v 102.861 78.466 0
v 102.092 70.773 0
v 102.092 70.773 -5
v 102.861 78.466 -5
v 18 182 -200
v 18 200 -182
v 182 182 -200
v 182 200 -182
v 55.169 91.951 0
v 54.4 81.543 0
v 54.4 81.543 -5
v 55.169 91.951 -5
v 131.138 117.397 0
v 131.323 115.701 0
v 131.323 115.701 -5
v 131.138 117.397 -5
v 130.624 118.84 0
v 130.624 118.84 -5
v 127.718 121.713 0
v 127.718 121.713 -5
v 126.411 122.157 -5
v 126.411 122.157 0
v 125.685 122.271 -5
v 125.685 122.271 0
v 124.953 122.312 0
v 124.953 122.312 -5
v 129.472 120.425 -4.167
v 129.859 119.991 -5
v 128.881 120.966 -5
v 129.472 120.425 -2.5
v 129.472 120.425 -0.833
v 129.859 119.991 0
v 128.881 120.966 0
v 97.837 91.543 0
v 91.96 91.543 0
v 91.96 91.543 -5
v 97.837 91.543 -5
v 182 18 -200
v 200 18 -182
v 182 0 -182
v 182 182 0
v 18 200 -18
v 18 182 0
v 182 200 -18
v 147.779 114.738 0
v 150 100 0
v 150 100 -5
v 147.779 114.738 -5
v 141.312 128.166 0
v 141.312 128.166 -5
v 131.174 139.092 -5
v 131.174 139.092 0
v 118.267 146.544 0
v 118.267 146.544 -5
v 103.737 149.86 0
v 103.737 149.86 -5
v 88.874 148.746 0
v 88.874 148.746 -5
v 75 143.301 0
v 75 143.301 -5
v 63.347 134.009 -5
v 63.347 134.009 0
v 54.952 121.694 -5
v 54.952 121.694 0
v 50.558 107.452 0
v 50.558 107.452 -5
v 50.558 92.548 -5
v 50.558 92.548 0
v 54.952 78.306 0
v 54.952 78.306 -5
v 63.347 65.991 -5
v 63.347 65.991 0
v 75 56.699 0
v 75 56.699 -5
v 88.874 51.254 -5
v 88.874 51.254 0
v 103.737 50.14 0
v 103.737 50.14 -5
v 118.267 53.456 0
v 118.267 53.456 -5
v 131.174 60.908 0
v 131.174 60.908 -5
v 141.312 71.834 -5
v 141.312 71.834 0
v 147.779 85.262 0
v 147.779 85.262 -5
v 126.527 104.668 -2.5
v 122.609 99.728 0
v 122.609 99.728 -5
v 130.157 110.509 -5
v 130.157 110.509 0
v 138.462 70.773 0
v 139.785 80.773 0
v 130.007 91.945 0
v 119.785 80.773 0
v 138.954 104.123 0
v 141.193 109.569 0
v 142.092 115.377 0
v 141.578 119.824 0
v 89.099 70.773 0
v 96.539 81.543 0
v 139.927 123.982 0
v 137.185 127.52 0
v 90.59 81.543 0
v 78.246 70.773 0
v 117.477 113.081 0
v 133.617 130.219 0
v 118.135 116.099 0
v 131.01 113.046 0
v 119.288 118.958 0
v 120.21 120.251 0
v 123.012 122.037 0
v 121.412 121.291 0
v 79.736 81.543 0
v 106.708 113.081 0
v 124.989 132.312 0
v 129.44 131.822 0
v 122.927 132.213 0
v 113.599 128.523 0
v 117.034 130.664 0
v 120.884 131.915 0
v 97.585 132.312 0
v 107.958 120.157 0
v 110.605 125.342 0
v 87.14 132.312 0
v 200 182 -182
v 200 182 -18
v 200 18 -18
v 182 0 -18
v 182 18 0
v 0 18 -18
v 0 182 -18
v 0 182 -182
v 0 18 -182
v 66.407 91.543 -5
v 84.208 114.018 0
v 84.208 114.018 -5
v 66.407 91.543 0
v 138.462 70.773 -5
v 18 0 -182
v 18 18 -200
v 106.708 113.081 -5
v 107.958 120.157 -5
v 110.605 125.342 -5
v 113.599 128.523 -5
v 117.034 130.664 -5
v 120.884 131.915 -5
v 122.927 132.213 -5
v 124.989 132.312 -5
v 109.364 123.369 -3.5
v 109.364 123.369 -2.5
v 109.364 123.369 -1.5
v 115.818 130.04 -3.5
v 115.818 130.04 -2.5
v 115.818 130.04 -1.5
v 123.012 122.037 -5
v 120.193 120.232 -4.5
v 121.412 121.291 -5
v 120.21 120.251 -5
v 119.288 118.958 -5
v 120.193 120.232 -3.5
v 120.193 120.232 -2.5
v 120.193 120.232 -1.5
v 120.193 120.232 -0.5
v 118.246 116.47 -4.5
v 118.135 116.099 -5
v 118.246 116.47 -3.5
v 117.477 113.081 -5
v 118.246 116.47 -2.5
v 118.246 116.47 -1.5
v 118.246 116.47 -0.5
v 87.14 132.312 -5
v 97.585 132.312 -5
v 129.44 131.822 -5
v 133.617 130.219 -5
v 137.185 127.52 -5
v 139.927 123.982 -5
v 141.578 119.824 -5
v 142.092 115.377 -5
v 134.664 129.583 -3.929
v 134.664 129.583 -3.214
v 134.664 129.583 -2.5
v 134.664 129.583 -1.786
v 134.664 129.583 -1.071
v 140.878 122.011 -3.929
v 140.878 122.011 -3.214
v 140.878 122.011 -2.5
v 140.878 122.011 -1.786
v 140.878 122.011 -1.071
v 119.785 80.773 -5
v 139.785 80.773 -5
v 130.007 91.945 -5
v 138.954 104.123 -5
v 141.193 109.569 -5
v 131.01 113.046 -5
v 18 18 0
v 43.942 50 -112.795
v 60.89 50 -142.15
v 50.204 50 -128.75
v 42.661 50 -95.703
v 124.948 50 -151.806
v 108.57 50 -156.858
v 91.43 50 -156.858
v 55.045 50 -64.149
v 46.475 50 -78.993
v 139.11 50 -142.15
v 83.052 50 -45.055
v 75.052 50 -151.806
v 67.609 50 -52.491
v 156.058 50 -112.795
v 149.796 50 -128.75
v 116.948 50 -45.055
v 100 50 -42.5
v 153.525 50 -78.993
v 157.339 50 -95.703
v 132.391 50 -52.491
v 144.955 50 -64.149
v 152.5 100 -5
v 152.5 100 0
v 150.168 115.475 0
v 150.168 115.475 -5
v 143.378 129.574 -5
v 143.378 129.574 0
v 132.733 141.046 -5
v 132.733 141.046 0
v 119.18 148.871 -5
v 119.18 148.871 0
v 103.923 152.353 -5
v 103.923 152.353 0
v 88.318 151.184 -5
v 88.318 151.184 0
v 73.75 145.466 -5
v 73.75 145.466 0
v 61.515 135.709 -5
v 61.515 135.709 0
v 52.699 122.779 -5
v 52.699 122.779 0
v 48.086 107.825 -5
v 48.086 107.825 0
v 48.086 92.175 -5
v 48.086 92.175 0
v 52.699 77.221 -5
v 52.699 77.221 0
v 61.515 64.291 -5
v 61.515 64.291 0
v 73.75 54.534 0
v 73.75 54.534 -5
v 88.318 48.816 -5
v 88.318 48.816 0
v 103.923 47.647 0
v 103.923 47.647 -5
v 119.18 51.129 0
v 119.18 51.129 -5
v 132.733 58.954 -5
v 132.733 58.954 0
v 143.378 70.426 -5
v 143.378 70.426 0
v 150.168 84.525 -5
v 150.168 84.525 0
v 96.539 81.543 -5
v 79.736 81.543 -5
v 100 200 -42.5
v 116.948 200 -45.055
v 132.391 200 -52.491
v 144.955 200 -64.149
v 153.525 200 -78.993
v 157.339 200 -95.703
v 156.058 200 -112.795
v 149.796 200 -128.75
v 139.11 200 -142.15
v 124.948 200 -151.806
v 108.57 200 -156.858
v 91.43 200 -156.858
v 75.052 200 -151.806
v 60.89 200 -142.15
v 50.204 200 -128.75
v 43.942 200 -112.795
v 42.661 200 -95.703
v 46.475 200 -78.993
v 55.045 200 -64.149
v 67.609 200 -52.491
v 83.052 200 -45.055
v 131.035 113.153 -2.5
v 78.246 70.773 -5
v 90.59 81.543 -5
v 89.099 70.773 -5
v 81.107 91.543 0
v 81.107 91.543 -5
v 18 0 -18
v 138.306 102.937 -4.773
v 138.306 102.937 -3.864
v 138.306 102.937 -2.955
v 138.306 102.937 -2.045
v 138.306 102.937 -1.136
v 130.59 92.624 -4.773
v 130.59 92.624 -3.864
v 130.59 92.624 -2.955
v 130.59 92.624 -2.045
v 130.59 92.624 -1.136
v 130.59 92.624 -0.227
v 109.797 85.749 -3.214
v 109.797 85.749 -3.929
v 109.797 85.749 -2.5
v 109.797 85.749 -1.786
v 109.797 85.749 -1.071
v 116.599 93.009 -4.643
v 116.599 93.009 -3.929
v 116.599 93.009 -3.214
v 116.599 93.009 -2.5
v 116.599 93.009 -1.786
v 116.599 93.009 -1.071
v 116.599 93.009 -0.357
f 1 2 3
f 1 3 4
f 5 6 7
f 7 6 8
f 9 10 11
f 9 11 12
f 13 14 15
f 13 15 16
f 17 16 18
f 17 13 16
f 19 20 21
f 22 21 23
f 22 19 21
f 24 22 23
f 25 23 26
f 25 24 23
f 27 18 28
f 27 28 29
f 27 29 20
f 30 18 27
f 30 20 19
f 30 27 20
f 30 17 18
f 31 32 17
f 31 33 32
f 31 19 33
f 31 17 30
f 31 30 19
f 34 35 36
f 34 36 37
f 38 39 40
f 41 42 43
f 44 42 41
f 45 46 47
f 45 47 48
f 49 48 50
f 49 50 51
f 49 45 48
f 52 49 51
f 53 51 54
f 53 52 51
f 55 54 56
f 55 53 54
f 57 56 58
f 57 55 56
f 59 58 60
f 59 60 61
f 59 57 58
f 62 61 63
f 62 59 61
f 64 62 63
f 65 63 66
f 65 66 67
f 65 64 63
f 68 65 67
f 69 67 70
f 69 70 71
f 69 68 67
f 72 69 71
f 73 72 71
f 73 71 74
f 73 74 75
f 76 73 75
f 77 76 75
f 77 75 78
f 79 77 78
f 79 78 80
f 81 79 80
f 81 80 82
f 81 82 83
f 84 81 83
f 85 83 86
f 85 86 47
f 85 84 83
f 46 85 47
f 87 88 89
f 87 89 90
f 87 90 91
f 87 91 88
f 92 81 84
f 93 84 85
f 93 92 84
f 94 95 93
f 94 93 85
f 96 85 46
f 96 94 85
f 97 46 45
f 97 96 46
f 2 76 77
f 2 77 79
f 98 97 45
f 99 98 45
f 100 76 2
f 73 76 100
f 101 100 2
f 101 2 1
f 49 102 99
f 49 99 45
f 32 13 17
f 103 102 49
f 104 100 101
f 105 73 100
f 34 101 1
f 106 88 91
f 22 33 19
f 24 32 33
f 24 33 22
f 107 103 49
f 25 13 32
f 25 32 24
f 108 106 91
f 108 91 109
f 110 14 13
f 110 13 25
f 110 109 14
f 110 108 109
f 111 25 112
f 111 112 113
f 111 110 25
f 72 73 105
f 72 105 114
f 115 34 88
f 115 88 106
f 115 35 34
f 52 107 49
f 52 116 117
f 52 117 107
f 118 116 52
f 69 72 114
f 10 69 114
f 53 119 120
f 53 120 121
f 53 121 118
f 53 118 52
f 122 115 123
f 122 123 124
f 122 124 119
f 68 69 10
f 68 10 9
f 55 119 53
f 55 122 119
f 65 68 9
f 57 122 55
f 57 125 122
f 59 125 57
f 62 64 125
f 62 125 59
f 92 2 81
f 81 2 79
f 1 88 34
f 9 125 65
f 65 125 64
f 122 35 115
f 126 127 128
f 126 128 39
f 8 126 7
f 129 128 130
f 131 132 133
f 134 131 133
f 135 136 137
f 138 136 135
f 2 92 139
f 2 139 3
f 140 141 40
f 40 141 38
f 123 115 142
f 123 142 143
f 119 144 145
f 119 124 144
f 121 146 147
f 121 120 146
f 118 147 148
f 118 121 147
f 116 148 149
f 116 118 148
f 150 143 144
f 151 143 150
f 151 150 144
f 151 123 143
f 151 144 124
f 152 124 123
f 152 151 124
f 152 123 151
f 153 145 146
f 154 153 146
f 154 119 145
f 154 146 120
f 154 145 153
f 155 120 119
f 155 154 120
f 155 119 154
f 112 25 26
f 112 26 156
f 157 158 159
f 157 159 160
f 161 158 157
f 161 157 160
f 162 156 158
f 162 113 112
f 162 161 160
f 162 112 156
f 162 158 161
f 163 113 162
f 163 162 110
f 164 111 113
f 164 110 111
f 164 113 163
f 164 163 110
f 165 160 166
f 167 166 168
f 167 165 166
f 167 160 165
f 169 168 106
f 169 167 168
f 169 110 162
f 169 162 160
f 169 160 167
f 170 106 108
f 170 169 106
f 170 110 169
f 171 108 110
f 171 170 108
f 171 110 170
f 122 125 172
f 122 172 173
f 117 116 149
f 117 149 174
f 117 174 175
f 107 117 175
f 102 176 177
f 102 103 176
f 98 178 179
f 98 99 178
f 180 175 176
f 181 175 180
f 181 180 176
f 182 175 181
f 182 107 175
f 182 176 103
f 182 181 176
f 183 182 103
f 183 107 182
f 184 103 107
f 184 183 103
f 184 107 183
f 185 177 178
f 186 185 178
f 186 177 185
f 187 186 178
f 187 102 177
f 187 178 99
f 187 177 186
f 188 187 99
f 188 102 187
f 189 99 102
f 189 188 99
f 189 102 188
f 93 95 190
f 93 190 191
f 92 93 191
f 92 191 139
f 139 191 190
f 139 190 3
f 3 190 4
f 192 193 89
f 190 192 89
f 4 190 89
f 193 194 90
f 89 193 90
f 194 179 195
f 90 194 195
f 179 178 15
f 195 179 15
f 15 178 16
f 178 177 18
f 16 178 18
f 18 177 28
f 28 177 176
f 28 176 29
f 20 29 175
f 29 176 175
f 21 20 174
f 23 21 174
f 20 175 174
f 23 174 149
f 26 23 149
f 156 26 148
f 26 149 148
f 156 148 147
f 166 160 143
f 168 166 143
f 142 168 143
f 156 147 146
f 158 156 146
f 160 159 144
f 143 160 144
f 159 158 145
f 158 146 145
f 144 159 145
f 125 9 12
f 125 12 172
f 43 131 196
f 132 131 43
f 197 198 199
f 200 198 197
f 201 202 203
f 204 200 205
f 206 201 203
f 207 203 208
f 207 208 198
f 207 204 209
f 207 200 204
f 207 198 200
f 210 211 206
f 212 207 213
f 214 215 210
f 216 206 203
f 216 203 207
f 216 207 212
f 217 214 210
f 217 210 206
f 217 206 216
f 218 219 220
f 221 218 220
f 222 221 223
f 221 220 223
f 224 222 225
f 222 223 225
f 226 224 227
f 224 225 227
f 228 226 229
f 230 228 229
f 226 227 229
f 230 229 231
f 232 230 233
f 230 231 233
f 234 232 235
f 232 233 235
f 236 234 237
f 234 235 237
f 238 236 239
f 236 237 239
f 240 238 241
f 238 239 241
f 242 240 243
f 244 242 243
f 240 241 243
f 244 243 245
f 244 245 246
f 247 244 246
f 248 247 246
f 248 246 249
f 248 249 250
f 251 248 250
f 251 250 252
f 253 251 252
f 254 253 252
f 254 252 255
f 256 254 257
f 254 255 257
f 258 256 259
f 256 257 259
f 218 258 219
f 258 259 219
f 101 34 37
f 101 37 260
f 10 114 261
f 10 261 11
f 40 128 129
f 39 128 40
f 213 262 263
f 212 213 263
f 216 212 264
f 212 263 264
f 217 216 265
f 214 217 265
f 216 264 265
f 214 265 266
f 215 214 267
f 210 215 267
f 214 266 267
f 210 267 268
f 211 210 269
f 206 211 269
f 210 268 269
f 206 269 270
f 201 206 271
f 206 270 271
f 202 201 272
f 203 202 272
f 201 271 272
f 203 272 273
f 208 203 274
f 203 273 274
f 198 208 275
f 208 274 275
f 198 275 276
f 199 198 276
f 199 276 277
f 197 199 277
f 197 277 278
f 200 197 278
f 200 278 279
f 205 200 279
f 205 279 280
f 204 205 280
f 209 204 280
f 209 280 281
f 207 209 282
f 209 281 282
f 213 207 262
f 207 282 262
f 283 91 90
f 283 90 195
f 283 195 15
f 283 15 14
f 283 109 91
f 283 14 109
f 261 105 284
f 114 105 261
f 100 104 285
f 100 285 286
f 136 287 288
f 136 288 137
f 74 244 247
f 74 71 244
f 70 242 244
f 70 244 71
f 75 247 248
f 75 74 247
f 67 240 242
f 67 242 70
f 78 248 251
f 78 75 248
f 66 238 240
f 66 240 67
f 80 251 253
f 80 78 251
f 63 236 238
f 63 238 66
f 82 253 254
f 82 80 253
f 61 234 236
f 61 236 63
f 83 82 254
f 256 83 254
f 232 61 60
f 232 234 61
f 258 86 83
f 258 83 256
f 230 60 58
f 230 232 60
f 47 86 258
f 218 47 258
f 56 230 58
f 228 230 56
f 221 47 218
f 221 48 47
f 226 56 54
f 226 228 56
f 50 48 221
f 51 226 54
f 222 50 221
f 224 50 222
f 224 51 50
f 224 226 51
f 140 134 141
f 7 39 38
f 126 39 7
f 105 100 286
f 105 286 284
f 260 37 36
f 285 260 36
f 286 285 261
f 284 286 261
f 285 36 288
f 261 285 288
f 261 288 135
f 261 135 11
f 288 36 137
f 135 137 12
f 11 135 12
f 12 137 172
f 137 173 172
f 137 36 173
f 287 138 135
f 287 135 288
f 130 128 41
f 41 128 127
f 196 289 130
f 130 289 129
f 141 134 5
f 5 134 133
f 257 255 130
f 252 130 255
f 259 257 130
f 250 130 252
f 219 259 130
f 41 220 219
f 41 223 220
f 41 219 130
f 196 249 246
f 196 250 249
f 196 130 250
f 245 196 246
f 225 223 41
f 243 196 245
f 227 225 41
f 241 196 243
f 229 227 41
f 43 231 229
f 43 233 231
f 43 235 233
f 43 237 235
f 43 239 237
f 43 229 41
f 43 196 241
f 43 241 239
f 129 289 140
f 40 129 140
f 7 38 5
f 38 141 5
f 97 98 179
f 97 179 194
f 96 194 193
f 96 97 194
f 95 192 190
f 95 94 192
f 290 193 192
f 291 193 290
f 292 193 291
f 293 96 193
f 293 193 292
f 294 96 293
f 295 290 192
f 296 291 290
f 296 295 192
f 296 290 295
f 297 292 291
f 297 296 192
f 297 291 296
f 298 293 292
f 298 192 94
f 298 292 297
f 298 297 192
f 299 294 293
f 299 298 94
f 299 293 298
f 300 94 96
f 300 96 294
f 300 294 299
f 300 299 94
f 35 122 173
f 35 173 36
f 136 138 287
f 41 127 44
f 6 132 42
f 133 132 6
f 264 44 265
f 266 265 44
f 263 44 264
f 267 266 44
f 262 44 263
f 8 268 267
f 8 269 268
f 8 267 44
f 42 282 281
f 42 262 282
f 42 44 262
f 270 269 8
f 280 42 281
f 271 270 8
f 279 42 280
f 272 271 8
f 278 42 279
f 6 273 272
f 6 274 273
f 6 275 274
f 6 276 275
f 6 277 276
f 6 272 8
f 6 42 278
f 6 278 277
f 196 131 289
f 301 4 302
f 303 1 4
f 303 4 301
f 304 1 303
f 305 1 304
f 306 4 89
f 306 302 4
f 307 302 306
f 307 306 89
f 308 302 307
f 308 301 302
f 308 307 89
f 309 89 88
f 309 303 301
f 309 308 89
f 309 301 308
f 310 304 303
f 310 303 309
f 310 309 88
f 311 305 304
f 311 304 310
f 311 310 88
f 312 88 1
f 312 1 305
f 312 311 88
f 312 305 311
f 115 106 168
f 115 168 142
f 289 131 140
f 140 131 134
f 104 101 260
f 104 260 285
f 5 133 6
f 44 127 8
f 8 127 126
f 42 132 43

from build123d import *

# Parameters (mm, degrees)
SKETCH_1_W          = 200
SKETCH_1_H          = 200
EXTRUDE_1_DEPTH     = 200
CHAMFER_1_SIZE      = 18
SKETCH_2_R          = 57.5
CUT_EXTRUDE_1_DEPTH = 150
SKETCH_3_R          = 52.5
SKETCH_3_R_2        = 50
CUT_EXTRUDE_4_DEPTH = 5


with BuildPart() as part:
    # Sketch 1 → Extrude 1 (new body)
    with BuildSketch(Plane(origin=(0, 0, 0), x_dir=(0, 0, -1), z_dir=(1, 0, 0))):
        with Locations((100, 100)):
            Rectangle(SKETCH_1_W, SKETCH_1_H)
    extrude(amount=EXTRUDE_1_DEPTH)

    # Chamfer 1
    chamfer_1_edges = [part.edges().sort_by_distance(p)[0] for p in [
        (200, 100, -200),
        (200, 200, -100),
        (200, 100, 0),
        (0, 200, -100),
        (0, 100, -200),
        (0, 0, -100),
        (0, 100, 0),
        (200, 0, -100),
        (100, 200, 0),
        (100, 200, -200),
        (100, 0, -200),
        (100, 0, 0),
    ]]
    chamfer(chamfer_1_edges, length=CHAMFER_1_SIZE)

    # Sketch 2 → Cut-Extrude 1 (cut)
    with BuildSketch(Plane(origin=(0, 200, 0), x_dir=(1, 0, 0), z_dir=(0, 1, 0))):
        with Locations(Location((100, 100, 0), (0, 0, 270))):
            Circle(SKETCH_2_R)
    extrude(amount=-CUT_EXTRUDE_1_DEPTH, mode=Mode.SUBTRACT)

    # Sketch 3 → Cut-Extrude 4 (cut)
    with BuildSketch(Plane.XY):
        with Locations((100, 100)):
            Circle(SKETCH_3_R)
        with Locations((100, 100)):
            Circle(SKETCH_3_R_2, mode=Mode.SUBTRACT)
        with BuildLine():
            add(Edge.make_bspline(
                [(124.952810184, 122.311754672), (124.061928668, 122.316141415), (122.723328375, 122.065314477), (121.15976707, 121.17726781), (120.31812048, 120.404799304), (119.711791362, 119.661639483), (119.299662129, 118.992437635), (118.890623993, 118.246055909), (118.558018296, 117.387310251), (118.225423141, 116.448647339), (117.836741696, 115.008969129), (117.587459376, 113.876131637), (117.476848645, 113.080985442)],
                knots=[0, 0, 0, 0, 0.204127863, 0.304431221, 0.408409421, 0.463887314, 0.523727039, 0.588196002, 0.658593566, 0.734357814, 0.816313439, 1, 1, 1, 1], degree=3))
            Line((117.476848645, 113.080985442), (106.707617876, 113.080985442))
            add(Edge.make_bspline(
                [(106.707617876, 113.080985442), (106.781895264, 114.937649447), (107.131475338, 117.664732571), (108.237782966, 121.070374863), (109.302543269, 123.370468484), (110.613437766, 125.442055382), (112.132515124, 127.267990733), (113.875631172, 128.806059043), (115.795871388, 130.092952145), (117.895783577, 131.088301864), (120.9374414, 132.05768373), (123.358242769, 132.306151558), (124.988867876, 132.311754672)],
                knots=[0, 0, 0, 0, 0.188116369, 0.27589316, 0.361277617, 0.44378986, 0.523169186, 0.600666658, 0.678099482, 0.756216315, 0.834899655, 1, 1, 1, 1], degree=3))
            add(Edge.make_bspline(
                [(124.988867876, 132.311754672), (126.175754308, 132.315676764), (127.93496111, 132.179510664), (130.186678669, 131.655134145), (131.7726869, 131.129273666), (133.268472003, 130.437845008), (134.687294958, 129.602483287), (136.026293603, 128.613446176), (137.265267034, 127.476325352), (138.390653811, 126.231694174), (139.384787852, 124.902245602), (140.228434325, 123.499377361), (140.906924261, 122.013604885), (141.434573231, 120.458552141), (141.959304994, 118.255123496), (142.09551179, 116.535641705), (142.092233261, 115.376658519)],
                knots=[0, 0, 0, 0, 0.132319326, 0.195567087, 0.25726574, 0.318197153, 0.378841636, 0.440456231, 0.50334526, 0.56593404, 0.627190101, 0.688062599, 0.747996218, 0.808849065, 0.870792773, 1, 1, 1, 1], degree=3))
            add(Edge.make_bspline(
                [(142.092233261, 115.376658519), (142.09732202, 114.393518355), (141.95430932, 112.905639606), (141.581070463, 110.915109319), (141.148217608, 109.37826343), (140.624528159, 107.801834253), (139.967531924, 106.199142481), (139.199146108, 104.565449003), (138.455218348, 103.183260504), (137.779650529, 102.028028639), (137.171822841, 101.090201616), (136.490804976, 100.08130842), (135.711268931, 99.01064295), (134.866860384, 97.854812526), (133.910144174, 96.645058775), (132.880240035, 95.363192003), (131.771215601, 94.008863585), (130.567357552, 92.595436285), (129.285008389, 91.105753441), (127.911135514, 89.550736384), (126.443361597, 87.93660771), (124.906447454, 86.233134327), (122.679244122, 83.836732523), (120.967131822, 82.003308094), (119.784540953, 80.773293134)],
                knots=[0, 0, 0, 0, 0.069981715, 0.106336674, 0.144238498, 0.183709243, 0.224708791, 0.267639701, 0.312364973, 0.33656381, 0.36302672, 0.392021296, 0.423331852, 0.457435971, 0.494060334, 0.533269791, 0.574668339, 0.618846706, 0.665626965, 0.714798059, 0.766769623, 0.82116182, 0.878361292, 1, 1, 1, 1], degree=3))
            Line((119.784540953, 80.773293134), (139.784540953, 80.773293134))
            Line((139.784540953, 80.773293134), (138.462425568, 70.773293134))
            Line((138.462425568, 70.773293134), (102.092233261, 70.773293134))
            Line((102.092233261, 70.773293134), (102.86146403, 78.465600826))
            add(Edge.make_bspline(
                [(102.86146403, 78.465600826), (104.073053727, 79.737856076), (105.861414534, 81.588001167), (108.15811719, 84.030126363), (109.77444844, 85.719605027), (111.292181295, 87.342421418), (112.742192845, 88.873377879), (114.109044196, 90.319346392), (115.381760254, 91.694514713), (116.578546994, 92.97827206), (117.673765861, 94.197556125), (118.717301158, 95.306997342), (119.650706014, 96.356133448), (120.503599196, 97.32161107), (121.495876039, 98.422484298), (122.172586535, 99.230130727), (122.609060184, 99.727620057)],
                knots=[0, 0, 0, 0, 0.181614482, 0.265988361, 0.346548719, 0.423311675, 0.495675135, 0.564525855, 0.628995855, 0.68936882, 0.745950656, 0.798411213, 0.846803604, 0.891102717, 0.931584129, 1, 1, 1, 1], degree=3))
            add(Edge.make_bspline(
                [(122.609060184, 99.727620057), (123.542457488, 100.855288981), (124.884611957, 102.474543208), (126.494767665, 104.618871476), (127.522861077, 106.015472175), (128.390657407, 107.310563545), (129.306154563, 108.764488546), (129.869005007, 109.828049592), (130.157137107, 110.508870057)],
                knots=[0, 0, 0, 0, 0.332831745, 0.477817127, 0.609520417, 0.726973213, 0.832099586, 1, 1, 1, 1], degree=3))
            add(Edge.make_bspline(
                [(130.157137107, 110.508870057), (130.511822539, 111.366072382), (131.120426847, 113.057426489), (131.319730922, 114.845166367), (131.323002492, 115.701177749)],
                knots=[0, 0, 0, 0, 0.520562004, 1, 1, 1, 1], degree=3))
            add(Edge.make_bspline(
                [(131.323002492, 115.701177749), (131.302782595, 116.579231828), (131.136297941, 117.914660904), (130.3064802, 119.455009614), (129.500708922, 120.45075585), (128.538845138, 121.277303266), (127.061812678, 122.101056155), (125.792809521, 122.304509149), (124.952810184, 122.311754672)],
                knots=[0, 0, 0, 0, 0.259693846, 0.38313667, 0.508398189, 0.633351073, 0.752658268, 1, 1, 1, 1], degree=3))
        make_face()
        Polygon((55.169156338, 91.951177749), (87.140310184, 132.311754672), (97.585021722, 132.311754672), (91.960021722, 91.542523903), (97.837425568, 91.542523903), (96.539348645, 81.542523903), (90.589829415, 81.542523903), (89.099444799, 70.773293134), (78.246079415, 70.773293134), (79.73646403, 81.542523903), (54.399925568, 81.542523903), align=None)
        Polygon((81.106656338, 91.542523903), (84.207617876, 114.018485442), (66.407137107, 91.542523903), align=None, mode=Mode.SUBTRACT)
    extrude(amount=-CUT_EXTRUDE_4_DEPTH, mode=Mode.SUBTRACT)


solid = part.part
